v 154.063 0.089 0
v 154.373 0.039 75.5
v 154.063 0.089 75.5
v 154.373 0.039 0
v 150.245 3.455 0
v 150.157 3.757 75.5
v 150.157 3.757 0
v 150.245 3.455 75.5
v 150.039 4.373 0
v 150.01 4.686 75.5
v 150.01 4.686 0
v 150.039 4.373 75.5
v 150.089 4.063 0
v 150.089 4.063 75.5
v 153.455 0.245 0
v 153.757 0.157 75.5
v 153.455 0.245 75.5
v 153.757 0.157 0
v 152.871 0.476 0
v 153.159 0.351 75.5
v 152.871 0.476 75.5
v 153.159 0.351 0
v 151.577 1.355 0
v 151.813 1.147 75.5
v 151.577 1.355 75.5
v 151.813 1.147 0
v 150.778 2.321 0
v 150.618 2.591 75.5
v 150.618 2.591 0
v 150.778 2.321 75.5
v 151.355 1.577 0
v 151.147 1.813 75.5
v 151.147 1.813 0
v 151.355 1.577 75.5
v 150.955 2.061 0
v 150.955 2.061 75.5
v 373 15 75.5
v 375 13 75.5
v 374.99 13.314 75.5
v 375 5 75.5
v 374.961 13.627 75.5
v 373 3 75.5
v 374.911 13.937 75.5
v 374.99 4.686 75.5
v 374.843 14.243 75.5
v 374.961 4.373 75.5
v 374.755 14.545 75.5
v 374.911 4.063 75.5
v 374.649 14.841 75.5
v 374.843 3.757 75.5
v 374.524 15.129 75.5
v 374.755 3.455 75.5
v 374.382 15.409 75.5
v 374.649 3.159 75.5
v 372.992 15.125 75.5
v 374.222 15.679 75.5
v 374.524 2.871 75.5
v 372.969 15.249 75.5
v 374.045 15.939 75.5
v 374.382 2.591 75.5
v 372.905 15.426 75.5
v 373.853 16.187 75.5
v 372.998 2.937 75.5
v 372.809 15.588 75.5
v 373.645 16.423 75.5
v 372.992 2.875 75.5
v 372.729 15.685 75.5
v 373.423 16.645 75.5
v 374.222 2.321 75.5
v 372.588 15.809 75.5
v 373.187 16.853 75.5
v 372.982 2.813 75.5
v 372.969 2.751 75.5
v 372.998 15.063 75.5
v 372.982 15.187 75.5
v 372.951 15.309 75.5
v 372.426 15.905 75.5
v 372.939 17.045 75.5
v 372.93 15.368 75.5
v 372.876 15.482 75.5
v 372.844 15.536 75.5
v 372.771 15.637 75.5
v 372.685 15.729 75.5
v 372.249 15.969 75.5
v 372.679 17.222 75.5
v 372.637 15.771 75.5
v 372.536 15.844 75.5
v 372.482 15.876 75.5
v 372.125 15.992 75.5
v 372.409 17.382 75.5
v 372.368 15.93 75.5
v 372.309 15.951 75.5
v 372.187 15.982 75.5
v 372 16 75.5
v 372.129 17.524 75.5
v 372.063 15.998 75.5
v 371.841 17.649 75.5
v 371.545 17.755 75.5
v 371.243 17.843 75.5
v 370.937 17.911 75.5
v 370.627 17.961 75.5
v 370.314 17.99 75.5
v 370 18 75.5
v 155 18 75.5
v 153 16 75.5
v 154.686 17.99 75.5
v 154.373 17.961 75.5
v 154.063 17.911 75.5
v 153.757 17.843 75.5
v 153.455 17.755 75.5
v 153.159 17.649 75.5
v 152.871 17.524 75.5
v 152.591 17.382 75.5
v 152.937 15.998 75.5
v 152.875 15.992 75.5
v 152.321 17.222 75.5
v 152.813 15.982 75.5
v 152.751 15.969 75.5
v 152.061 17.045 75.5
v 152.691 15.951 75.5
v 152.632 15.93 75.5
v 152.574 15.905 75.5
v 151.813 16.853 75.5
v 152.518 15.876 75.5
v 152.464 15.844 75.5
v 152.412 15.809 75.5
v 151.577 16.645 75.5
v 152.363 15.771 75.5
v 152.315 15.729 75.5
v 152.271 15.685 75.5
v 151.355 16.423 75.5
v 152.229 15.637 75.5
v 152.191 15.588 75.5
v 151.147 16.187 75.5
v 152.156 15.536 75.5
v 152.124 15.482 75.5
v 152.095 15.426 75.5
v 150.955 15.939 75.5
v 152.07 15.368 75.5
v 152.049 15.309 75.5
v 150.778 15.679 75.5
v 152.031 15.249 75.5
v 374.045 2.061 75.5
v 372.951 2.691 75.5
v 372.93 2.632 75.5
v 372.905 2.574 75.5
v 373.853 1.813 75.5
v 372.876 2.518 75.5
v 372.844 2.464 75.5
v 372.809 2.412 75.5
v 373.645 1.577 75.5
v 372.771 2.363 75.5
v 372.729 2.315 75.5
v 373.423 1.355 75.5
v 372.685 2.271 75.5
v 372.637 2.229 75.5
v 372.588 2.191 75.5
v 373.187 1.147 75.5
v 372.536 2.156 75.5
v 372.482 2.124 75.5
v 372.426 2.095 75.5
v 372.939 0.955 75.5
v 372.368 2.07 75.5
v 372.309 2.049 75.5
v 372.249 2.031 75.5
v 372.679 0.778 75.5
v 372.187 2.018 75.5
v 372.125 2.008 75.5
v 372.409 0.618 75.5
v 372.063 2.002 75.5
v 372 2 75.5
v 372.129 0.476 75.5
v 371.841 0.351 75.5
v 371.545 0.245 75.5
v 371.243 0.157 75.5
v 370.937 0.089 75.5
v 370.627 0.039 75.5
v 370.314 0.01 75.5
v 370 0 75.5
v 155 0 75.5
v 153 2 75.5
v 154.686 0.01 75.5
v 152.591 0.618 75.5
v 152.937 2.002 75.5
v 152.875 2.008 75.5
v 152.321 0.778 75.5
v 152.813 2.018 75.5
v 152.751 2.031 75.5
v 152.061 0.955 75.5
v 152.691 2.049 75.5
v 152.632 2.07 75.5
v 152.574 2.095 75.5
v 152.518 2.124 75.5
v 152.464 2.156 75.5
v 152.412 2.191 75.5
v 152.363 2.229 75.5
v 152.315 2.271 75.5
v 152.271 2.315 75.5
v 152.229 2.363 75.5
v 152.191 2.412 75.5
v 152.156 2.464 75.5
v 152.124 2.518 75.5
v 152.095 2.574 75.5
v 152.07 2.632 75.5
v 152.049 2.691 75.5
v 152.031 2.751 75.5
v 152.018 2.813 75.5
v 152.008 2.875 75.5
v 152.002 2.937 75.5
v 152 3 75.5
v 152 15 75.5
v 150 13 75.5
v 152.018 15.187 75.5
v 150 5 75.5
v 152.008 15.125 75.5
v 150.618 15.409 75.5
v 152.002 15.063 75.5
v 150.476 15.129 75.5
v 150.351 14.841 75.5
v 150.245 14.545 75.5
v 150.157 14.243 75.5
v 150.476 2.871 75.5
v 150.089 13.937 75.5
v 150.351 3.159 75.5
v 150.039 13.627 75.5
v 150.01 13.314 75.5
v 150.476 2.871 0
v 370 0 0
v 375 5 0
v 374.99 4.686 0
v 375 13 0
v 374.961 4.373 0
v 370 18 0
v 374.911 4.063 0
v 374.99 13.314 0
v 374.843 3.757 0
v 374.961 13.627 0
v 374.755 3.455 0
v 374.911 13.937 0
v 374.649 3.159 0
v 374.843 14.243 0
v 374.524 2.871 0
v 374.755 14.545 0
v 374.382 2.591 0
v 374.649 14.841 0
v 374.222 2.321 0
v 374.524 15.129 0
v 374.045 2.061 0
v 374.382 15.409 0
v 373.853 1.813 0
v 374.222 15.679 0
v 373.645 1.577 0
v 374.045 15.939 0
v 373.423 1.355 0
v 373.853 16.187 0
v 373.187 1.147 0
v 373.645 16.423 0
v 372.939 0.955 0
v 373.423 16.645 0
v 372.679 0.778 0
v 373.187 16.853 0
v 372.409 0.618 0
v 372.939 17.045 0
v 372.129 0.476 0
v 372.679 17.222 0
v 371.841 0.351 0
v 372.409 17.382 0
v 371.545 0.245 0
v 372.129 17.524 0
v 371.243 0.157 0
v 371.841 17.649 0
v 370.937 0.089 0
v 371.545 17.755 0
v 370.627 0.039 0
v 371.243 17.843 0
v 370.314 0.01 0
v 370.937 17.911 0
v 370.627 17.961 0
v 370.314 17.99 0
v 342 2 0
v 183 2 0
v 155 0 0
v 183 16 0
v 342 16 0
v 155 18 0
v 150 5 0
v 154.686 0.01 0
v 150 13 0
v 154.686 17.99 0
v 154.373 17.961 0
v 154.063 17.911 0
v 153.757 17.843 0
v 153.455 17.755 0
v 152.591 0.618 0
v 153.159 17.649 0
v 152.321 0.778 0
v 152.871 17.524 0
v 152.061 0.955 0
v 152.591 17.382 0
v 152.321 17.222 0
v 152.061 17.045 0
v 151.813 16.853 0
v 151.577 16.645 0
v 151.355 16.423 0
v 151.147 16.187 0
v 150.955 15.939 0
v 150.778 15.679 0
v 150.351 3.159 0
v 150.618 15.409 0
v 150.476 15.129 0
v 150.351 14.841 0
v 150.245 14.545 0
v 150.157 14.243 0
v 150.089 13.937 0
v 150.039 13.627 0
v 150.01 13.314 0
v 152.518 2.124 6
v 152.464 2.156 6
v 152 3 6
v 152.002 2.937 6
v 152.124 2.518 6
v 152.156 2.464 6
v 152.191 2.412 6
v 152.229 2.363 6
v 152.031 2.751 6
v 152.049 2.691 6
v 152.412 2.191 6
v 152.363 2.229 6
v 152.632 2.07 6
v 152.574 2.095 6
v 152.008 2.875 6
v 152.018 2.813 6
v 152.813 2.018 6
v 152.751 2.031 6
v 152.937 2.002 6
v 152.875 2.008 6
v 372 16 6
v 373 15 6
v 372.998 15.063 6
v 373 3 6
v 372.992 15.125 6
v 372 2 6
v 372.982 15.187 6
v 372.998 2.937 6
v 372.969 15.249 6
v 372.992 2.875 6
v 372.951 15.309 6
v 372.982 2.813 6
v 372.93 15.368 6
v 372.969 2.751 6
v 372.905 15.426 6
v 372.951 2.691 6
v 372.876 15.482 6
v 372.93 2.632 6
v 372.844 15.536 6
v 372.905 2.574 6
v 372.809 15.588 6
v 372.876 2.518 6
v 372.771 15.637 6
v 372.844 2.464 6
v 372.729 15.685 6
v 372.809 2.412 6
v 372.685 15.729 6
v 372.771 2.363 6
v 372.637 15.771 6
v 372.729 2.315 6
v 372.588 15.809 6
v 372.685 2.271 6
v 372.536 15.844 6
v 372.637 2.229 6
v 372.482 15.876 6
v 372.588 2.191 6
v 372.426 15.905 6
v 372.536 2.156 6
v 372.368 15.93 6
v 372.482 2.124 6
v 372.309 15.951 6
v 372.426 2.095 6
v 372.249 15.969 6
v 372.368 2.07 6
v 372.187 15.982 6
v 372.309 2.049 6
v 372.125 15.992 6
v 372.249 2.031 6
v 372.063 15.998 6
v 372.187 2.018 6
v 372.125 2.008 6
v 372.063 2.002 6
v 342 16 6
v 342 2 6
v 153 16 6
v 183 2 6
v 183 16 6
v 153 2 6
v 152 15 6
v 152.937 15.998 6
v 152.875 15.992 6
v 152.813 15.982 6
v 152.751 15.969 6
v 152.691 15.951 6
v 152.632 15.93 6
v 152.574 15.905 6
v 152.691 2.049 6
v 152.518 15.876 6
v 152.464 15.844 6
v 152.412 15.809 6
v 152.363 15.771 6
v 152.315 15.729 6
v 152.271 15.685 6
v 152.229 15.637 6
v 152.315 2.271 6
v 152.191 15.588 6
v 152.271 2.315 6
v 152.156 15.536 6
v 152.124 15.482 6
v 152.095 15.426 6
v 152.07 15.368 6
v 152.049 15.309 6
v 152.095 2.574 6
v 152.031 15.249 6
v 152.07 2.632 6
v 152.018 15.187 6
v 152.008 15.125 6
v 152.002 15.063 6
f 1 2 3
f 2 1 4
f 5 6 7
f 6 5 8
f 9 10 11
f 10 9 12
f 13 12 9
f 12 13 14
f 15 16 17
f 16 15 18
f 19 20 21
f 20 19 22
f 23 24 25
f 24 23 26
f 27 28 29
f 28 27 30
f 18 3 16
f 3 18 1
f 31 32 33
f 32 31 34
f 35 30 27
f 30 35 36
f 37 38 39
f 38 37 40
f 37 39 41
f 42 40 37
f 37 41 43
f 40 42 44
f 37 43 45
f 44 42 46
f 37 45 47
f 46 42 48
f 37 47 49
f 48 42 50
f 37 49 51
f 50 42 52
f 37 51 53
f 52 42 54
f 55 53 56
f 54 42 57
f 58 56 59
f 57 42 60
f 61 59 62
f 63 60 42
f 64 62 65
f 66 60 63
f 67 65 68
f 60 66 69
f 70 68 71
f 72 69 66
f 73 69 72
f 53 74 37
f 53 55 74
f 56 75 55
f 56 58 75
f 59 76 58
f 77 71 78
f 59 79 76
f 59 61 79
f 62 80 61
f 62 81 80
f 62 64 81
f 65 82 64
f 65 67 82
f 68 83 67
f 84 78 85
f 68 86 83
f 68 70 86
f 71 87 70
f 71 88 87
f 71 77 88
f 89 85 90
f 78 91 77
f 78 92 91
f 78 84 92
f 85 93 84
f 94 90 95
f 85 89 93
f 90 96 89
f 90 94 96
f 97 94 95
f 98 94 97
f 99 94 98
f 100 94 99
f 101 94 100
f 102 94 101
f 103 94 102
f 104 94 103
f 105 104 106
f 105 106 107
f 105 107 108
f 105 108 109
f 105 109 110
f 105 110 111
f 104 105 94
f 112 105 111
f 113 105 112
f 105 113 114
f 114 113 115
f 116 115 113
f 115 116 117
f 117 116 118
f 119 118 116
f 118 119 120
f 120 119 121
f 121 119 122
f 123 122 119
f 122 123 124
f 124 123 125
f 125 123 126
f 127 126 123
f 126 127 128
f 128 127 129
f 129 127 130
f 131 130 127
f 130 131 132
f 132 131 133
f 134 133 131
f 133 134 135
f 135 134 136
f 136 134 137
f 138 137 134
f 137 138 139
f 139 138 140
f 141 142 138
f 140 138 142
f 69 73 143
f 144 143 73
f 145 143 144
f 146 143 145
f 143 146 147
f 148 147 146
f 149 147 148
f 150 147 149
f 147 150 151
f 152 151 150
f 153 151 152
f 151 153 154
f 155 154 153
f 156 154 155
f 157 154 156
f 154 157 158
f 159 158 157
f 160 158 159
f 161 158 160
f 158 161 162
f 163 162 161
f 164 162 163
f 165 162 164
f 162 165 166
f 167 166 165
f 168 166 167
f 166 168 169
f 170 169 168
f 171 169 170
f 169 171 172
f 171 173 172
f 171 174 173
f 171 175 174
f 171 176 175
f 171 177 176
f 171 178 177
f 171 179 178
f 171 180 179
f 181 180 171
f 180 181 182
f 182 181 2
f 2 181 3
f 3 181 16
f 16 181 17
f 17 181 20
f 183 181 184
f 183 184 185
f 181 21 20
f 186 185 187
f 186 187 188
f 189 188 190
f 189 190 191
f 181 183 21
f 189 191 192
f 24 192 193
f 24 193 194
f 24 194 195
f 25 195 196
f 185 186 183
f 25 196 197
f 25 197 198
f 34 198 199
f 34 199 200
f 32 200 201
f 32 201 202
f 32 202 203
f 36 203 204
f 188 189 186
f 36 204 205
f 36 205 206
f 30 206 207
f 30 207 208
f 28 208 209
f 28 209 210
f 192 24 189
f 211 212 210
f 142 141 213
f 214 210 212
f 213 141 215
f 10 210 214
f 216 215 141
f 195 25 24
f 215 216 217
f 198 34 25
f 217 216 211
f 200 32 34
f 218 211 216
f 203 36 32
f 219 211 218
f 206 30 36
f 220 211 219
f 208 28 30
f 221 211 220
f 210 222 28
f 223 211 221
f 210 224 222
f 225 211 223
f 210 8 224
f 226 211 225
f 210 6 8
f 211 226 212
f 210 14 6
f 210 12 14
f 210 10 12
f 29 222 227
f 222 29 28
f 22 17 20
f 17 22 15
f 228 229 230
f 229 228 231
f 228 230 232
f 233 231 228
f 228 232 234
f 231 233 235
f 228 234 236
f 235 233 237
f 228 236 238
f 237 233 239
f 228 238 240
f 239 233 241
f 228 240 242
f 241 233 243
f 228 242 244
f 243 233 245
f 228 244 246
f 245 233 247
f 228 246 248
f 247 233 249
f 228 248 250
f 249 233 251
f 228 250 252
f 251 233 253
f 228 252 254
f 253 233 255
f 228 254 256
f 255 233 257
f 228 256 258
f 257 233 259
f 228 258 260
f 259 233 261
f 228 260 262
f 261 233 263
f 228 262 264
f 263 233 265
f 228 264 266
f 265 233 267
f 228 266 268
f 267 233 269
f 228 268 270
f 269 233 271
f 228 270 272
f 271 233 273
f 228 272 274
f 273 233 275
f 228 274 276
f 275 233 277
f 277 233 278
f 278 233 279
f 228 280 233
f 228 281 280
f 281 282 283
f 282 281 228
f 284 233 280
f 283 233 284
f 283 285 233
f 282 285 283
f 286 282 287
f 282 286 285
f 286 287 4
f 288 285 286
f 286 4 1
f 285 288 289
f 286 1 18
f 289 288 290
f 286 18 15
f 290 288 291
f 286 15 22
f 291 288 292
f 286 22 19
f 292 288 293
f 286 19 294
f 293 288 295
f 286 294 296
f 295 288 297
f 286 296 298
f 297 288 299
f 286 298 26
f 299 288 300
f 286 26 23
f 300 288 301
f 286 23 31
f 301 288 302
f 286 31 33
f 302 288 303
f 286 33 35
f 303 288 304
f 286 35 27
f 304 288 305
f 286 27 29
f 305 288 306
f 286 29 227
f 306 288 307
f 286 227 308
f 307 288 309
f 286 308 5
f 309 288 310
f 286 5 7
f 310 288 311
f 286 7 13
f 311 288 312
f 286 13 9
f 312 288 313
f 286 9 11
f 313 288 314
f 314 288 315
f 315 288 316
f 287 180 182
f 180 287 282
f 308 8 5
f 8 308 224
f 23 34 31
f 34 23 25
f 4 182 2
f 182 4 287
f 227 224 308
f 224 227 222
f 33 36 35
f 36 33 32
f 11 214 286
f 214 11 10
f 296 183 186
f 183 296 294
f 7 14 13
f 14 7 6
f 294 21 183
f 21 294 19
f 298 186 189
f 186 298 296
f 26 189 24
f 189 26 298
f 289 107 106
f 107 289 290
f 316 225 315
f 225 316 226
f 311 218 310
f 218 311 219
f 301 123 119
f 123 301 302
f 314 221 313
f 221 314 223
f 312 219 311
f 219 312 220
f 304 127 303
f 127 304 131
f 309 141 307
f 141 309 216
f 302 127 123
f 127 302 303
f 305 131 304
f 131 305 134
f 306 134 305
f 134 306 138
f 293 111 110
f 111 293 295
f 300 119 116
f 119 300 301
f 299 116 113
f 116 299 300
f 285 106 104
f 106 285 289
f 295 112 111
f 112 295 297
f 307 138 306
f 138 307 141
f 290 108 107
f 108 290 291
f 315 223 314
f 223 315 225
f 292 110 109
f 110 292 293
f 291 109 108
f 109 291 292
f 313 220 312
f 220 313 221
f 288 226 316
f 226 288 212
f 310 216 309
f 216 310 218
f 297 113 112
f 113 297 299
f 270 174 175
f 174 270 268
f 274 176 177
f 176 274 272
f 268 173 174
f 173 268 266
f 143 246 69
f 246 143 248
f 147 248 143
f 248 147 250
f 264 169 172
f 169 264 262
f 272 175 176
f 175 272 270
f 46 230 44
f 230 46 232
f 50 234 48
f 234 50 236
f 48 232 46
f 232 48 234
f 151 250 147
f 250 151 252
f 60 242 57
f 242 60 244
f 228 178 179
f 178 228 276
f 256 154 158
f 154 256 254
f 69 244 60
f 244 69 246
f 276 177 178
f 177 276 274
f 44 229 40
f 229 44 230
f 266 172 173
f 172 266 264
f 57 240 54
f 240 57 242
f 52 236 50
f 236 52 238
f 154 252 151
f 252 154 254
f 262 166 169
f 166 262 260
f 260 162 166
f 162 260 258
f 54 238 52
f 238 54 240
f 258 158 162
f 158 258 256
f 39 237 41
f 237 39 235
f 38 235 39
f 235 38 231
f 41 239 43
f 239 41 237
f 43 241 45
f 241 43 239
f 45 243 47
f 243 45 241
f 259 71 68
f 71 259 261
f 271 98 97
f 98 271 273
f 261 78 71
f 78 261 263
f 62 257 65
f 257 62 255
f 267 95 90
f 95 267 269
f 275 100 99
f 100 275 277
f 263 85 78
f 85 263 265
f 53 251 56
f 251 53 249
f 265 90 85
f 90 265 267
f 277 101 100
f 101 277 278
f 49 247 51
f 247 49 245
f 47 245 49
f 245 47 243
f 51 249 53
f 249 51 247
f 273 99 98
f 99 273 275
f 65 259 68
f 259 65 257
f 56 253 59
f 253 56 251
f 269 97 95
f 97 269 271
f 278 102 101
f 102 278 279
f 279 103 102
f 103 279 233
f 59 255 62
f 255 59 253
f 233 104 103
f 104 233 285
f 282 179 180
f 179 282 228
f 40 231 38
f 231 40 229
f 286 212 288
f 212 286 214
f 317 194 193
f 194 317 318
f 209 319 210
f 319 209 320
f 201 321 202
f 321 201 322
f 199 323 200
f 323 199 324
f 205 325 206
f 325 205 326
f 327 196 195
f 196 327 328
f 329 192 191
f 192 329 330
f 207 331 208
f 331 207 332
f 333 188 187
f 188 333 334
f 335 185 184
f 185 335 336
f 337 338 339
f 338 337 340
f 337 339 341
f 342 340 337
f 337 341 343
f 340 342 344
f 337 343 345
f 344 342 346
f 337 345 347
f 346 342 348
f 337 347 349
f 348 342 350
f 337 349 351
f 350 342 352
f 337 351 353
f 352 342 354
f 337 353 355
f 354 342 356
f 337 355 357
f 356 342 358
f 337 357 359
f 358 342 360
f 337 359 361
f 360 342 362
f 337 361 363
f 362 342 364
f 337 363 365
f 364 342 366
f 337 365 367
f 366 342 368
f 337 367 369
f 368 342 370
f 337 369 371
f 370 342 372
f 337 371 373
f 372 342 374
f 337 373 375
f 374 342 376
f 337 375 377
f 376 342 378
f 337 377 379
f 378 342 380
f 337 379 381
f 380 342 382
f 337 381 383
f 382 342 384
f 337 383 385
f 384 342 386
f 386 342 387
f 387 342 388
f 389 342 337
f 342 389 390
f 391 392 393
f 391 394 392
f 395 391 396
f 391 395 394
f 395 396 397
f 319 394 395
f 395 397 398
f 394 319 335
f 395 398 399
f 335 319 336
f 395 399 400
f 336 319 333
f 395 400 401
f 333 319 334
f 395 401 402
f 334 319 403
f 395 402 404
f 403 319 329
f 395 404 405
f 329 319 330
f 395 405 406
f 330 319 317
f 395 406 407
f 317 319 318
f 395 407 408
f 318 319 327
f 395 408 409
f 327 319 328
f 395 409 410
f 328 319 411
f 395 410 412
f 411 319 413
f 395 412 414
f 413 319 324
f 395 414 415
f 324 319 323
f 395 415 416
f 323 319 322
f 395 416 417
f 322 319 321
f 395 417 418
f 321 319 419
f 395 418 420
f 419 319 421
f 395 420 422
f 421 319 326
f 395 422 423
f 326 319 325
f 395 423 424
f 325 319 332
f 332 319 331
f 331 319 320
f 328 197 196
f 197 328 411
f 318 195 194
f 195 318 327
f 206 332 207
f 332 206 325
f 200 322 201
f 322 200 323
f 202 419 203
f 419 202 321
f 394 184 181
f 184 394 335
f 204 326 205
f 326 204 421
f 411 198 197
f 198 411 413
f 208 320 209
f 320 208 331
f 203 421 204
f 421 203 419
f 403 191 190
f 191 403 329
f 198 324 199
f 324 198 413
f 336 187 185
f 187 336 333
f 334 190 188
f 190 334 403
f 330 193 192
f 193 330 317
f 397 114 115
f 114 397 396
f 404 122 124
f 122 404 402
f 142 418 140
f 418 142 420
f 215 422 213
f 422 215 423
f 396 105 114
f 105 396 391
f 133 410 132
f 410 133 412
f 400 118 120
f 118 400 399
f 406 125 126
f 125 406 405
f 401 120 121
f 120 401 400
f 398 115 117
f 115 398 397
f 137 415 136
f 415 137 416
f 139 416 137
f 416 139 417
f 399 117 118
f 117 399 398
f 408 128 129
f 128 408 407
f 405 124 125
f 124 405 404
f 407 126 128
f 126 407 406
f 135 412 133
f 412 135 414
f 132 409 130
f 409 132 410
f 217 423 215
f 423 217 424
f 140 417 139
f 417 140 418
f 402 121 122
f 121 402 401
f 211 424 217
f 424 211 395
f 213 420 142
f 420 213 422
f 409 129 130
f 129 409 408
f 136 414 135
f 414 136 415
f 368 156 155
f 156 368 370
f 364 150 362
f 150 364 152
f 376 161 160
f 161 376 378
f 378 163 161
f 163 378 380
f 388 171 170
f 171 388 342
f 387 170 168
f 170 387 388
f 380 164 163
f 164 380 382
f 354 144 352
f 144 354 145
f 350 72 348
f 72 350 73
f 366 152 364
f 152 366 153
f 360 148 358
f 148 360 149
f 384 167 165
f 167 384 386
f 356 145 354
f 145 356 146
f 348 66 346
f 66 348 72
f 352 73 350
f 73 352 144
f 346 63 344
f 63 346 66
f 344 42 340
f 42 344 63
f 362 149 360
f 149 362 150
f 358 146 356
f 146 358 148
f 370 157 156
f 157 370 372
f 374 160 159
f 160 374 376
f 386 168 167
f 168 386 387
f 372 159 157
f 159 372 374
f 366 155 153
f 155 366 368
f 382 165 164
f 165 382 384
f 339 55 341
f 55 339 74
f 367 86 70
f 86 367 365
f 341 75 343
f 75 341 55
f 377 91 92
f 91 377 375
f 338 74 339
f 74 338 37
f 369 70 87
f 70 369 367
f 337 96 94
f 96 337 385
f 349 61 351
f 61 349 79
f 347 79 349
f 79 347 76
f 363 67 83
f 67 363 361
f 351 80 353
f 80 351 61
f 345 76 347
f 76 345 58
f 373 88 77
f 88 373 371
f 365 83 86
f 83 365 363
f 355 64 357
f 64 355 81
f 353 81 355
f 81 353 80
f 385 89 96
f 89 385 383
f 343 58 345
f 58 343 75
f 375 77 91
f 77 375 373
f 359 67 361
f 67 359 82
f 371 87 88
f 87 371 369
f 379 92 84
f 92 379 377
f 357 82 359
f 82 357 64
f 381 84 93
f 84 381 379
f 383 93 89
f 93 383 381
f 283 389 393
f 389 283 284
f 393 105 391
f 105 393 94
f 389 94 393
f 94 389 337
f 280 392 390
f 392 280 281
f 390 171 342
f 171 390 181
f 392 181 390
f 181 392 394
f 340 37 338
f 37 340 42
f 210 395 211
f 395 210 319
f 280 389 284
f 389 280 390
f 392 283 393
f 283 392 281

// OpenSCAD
// file: clips.scad
/*
Provides 2 functions:
    clip(height): An actual clip, height is the height to print with the click laid flat
    socket(height): The cutout to generate for the clip. It's suggented to make the height slightly more to ease access
*/
CLIP_STOPPER = 2;
CLIP_SOCKET_W = 7*2;
CLIP_SOCKET_D = 10.6;

module sampleclipsocket() {
    translate([0, 0, 0]) {
        union() {
            clip(1);
            //translate([-6, -10, 0]) cube([12, 10, 1]);
            mirror([0, 1, 0]) clip(1);
        }
    }
    //%cliphollow(2);

    rotate([-90, 0, 0]) {
    translate([20, -13, 0]) {
        difference() {
            translate([-10, 0, 0]) cube([20, 13, 3]);
            translate([0, 0, 1.4/2]) socket(1.6);
        }
    }
}
}

//sampleclipsocket();

clipmainpoints = [
    [4.9, 5.695],
    [5.197, 5.905],
        // Edges of outer corner
        [5.253, 5.991],
        [5.297, 6.103],
        [5.324, 6.233],
        [5.331, 6.37],
    [5.318, 6.50],
    [4.868, 7.284],
    [2.55, 9.60],
    ];

clipstopperpoints = [
    [0,0],
    [6.6, 0],
    [6.6, CLIP_STOPPER],
    [4.9, CLIP_STOPPER],
];

cliphollowpoints = concat(clipmainpoints, [[0,  9.60], [0, 1.5], [4.9, 1.5]]);

//for(x=clipmainpoints) translate(x) color("aqua") cylinder(h=2, d=0.1);
//for(x=clipstopperpoints) translate(x) color("red") cylinder(h=2, d=0.1);
//for(x=clipmainpoints) translate(x) color("aqua") cylinder(h=2, d=0.1);
    
// The area to hollow out around a clip so the arms can bend
// Area should be hollowed, before clip is then built in place
module cliphollow(h) {
    linear_extrude(h) polygon(cliphollowpoints);
    linear_extrude(h) mirror([1, 0 ,0]) polygon(cliphollowpoints);
}

module socket(h) {
    linear_extrude(h) socketpolygon();
}

module socketpolygon() {
    socketedge();
    mirror([1, 0 ,0]) socketedge();
    
    module socketedge() {
        polygon([
            [0, 0], 
            [7, 0],
            [7, 2],
            [6, 2],
            [5, 5],
            [5, 6],
            [7, 6],
            [7, 10.6],
            [0, 10.6],
            ]);
    }
}

module clip(h, scale_width=1) {
    scale([scale_width, 1, 1]) linear_extrude(h) clippolygon();
}



module clippolygon() {
    //W = 13.2;
    D = 3.7;
   // H = 3.5;
    H = 1.5;
    
    clipedge();
    mirror([1, 0, 0]) clipedge();

    module clipedge() {
        resolution = 20;




        curve = [
            [1, 9.60],
            [2.1, 5.85],
            [2.7, 1.55],
            [0, 1.578],
            ];
        curvepoints = bezier(curve);

        fullpoints = concat(curvepoints, clipstopperpoints, clipmainpoints);
        polygon(fullpoints);


        function choose(n, k)=
             k == 0 ? 1 : (n * choose(n - 1, k - 1)) / k;

        function _point_on_bezier_rec(points,t,i,c)=
            len(points) == i ? c
            : _point_on_bezier_rec(points,t,i+1,c+choose(len(points)-1,i) * pow(t,i) * pow(1-t,len(points)-i-1) * points[i]);

        function _point_on_bezier(points,t)=
            _point_on_bezier_rec(points,t,0,[0,0]);

        //a bezier curve with any number of control points
        //parameters: 
        //points - the control points of the bezier curve (number of points is variable)
        //returns:
        //resolution number of samples on the bezier curve
        function bezier(points)=[
            for (t =[0:1.0/resolution:1+1.0/(resolution/2)]) _point_on_bezier(points,t)
        ];

    }
}
// file: consts.scad
$fn=100;

FLOOR = 1;
WALL = 1;
BASE_H= 3;

CLIP_H = 1.4;

BOX_H = 115;
BOX_W = 305;
BOX_D = 305;

// Upper tray for large minis
UPPER_MINI_MAX_H = 74;
UPPER_TRAY_H = FLOOR + UPPER_MINI_MAX_H; // 75mm
UPPER_TRAY_W = 140;
UPPER_TRAY_D = 131;

// Lower tray for small minis
LOWER_MINI_MAX_H = 47;
LOWER_TRAY_W = 200;
LOWER_TRAY_D = 200;
LOWER_TRAY_H  = FLOOR + LOWER_MINI_MAX_H; // 48mm
LOWER_TRAY_UPPER_H = BOX_H - UPPER_TRAY_H; // 40mm

// Terrain tiles
LARGE_TERRAIN_TILE_W = 217;
LARGE_TERRAIN_TILE_D = 115;
LARGE_TERRAIN_TILE_H = 9; // stack

SMALL_TERRAIN_TILE_W = 115;
SMALL_TERRAIN_TILE_D = 115;
SMALL_TERRAIN_TILE_H = 68;

TERRAIN_FLOOR = 1;
TERRAIN_SUPPORT = 3;
TERRAIN_WALL = 3;
TERRAIN_PEG_EDGE = 20;

SMALL_TERRAIN_TILES = 32;
LARGE_TERRAIN_TILES = 4;

SMALL_TERRAIN_BASE_W = SMALL_TERRAIN_TILE_W*2;
SMALL_TERRAIN_BASE_D = SMALL_TERRAIN_TILE_D;
SMALL_TERRAIN_BASE_H = SMALL_TERRAIN_TILE_H/2 + TERRAIN_SUPPORT + 9;

LARGE_TERRAIN_BASE_W = LARGE_TERRAIN_TILE_W;
LARGE_TERRAIN_BASE_D = LARGE_TERRAIN_TILE_D;
LARGE_TERRAIN_BASE_H = LARGE_TERRAIN_TILE_H + TERRAIN_SUPPORT + 9;

TERRAIN_V_WALL = 2;
TERRAIN_TAB_W = 6;
TERRAIN_TAB_D = 16;
TERRAIN_V_SUPPORT_W = TERRAIN_TAB_W + 25;

SMALL_TERRAIN_BOX_W = SMALL_TERRAIN_TILE_W + TERRAIN_V_WALL*2 + 4;
SMALL_TERRAIN_BOX_D = SMALL_TERRAIN_TILE_H + TERRAIN_V_WALL*2 + 5;
SMALL_TERRAIN_BOX_H = SMALL_TERRAIN_TILE_D/2 + TERRAIN_V_WALL + TERRAIN_TAB_D;

LARGE_TERRAIN_BOX_W = LARGE_TERRAIN_TILE_W + TERRAIN_V_WALL*2 + 4;
LARGE_TERRAIN_BOX_D = LARGE_TERRAIN_TILE_H + TERRAIN_V_WALL*2 + 5;
LARGE_TERRAIN_BOX_H = LARGE_TERRAIN_TILE_D/2 + TERRAIN_V_WALL + TERRAIN_TAB_D;

// Cards
CARD_W = 64;
CARD_D = 89;
CARD_STACK = 30;

CARD_WALL = 1.5;
CARD_EDGE_WALL = CLIP_H + 2;

CARD_BOX_W = CARD_W + CARD_EDGE_WALL*2 + 2;
CARD_BOX_D = CARD_STACK + CARD_WALL*2 + 5;
CARD_BOX_H = CARD_D / 3 * 2 + CARD_WALL;

CARD_BOX_LID_H = CARD_D / 3 + CARD_WALL + 5;




// A small file to allow clips to made to provide a cover where required
include <clips.scad>

use <MCAD/boxes.scad>

module roundedCube(size, radius, sidesonly) {
    translate([size[0]/2, size[1]/2, size[2]/2]) roundedBox(size, radius, sidesonly);
}
// main file
include <consts.scad>;


module small_terrain_tiles_vertical() {
    difference() {
        union() {
            translate([0, 0, 0]) roundedCube([SMALL_TERRAIN_BOX_W, SMALL_TERRAIN_BOX_D, SMALL_TERRAIN_BOX_H], 5, true);
            echo([SMALL_TERRAIN_BOX_W, SMALL_TERRAIN_BOX_D, SMALL_TERRAIN_BOX_H], 5, true);
        }
        translate([TERRAIN_V_WALL, TERRAIN_V_WALL, TERRAIN_TAB_W]) roundedCube([SMALL_TERRAIN_BOX_W-TERRAIN_V_WALL*2, SMALL_TERRAIN_BOX_D-TERRAIN_V_WALL*2, SMALL_TERRAIN_BOX_H], 1, true);
        translate([TERRAIN_V_SUPPORT_W+TERRAIN_V_WALL, TERRAIN_V_WALL, -0.1]) cube([SMALL_TERRAIN_BOX_W-TERRAIN_V_SUPPORT_W*2-TERRAIN_V_WALL*2, SMALL_TERRAIN_BOX_D-TERRAIN_V_WALL*2, SMALL_TERRAIN_BOX_H], 5, true);
    }
    //#translate([TERRAIN_V_WALL, 2*SMALL_TERRAIN_TILES+TERRAIN_V_WALL, 0]) rotate([90, 0, 0]) small_terrain_tile(SMALL_TERRAIN_TILES);
}

module large_terrain_tiles_vertical() {
    difference() {
        union() {
            translate([0, 0, 0]) roundedCube([LARGE_TERRAIN_BOX_W, LARGE_TERRAIN_BOX_D, LARGE_TERRAIN_BOX_H], 5, true);
            echo([LARGE_TERRAIN_BOX_W, LARGE_TERRAIN_BOX_D, LARGE_TERRAIN_BOX_H], 5, true);
        }
        translate([TERRAIN_V_WALL, TERRAIN_V_WALL, TERRAIN_TAB_W]) roundedCube([LARGE_TERRAIN_BOX_W-TERRAIN_V_WALL*2, LARGE_TERRAIN_BOX_D-TERRAIN_V_WALL*2, LARGE_TERRAIN_BOX_H], 1, true);
        translate([TERRAIN_V_SUPPORT_W+TERRAIN_V_WALL, TERRAIN_V_WALL, -0.1]) cube([LARGE_TERRAIN_BOX_W-TERRAIN_V_SUPPORT_W*2-TERRAIN_V_WALL*2, LARGE_TERRAIN_BOX_D-TERRAIN_V_WALL*2, LARGE_TERRAIN_BOX_H], 5, true);
    }
    //#translate([TERRAIN_V_WALL, 2*LARGE_TERRAIN_TILES+TERRAIN_V_WALL, 0]) rotate([90, 0, 0]) large_terrain_tile(LARGE_TERRAIN_TILES);
}

module small_terrain_tiles() {
    difference() {
        union() {
            // Floor for the holder
            translate([0, 0, TERRAIN_SUPPORT-TERRAIN_FLOOR]) roundedCube([SMALL_TERRAIN_BASE_W, SMALL_TERRAIN_BASE_D, TERRAIN_FLOOR], 5, true);
            // Cubes for corner pegs, that are then cut out
            terrain_pegs(SMALL_TERRAIN_BASE_W/2, SMALL_TERRAIN_BASE_D, SMALL_TERRAIN_BASE_H);
            translate([SMALL_TERRAIN_BASE_W/2, 0, 0]) terrain_pegs(SMALL_TERRAIN_BASE_W/2, SMALL_TERRAIN_BASE_D, SMALL_TERRAIN_BASE_H);
            base_support(SMALL_TERRAIN_BASE_W, SMALL_TERRAIN_BASE_D);
            // A small peg to hold the tray above in place
            translate([SMALL_TERRAIN_BASE_W/2, 10, SMALL_TERRAIN_BASE_H]) cylinder(d=4, h=TERRAIN_SUPPORT);
            translate([SMALL_TERRAIN_BASE_W/2, SMALL_TERRAIN_BASE_D - 10, SMALL_TERRAIN_BASE_H]) cylinder(d=4, h=TERRAIN_SUPPORT);
        }
        // Thumb holes to get the last tiles out, offset to align with tile tab
        translate([0, SMALL_TERRAIN_BASE_D/2-10, -0.1]) cylinder(h=10, d=30);
        translate([SMALL_TERRAIN_BASE_W, SMALL_TERRAIN_BASE_D/2+10, -0.1]) cylinder(h=10, d=30);
    }
}

module large_terrain_tiles() {
    difference() {
        union() {
            // Floor for the holder
            translate([0, 0, TERRAIN_SUPPORT-TERRAIN_FLOOR]) roundedCube([LARGE_TERRAIN_BASE_W, LARGE_TERRAIN_BASE_D, TERRAIN_FLOOR], 5, true);
            // Cubes for corner pegs, that are then cut out
            terrain_pegs(LARGE_TERRAIN_BASE_W, LARGE_TERRAIN_BASE_D, LARGE_TERRAIN_BASE_H);
            base_support(LARGE_TERRAIN_BASE_W, LARGE_TERRAIN_BASE_D);
            // Support for the alignment holes
            translate([LARGE_TERRAIN_BASE_W/2, 10, 0]) cylinder(d=10, h=TERRAIN_SUPPORT);
            translate([LARGE_TERRAIN_BASE_W/2, LARGE_TERRAIN_BASE_D - 10, 0]) cylinder(d=10, h=TERRAIN_SUPPORT);
        }
        // Thumb holes to get the last tiles out, offset to align with tile tab
        translate([0, LARGE_TERRAIN_BASE_D/2-10, -0.1]) cylinder(h=10, d=30);
        // A small hole to align with the peg below
        translate([LARGE_TERRAIN_BASE_W/2, 10, -0.1]) cylinder(d=5, h=TERRAIN_SUPPORT+2);
        translate([LARGE_TERRAIN_BASE_W/2, LARGE_TERRAIN_BASE_D - 10, -0.1]) cylinder(d=5, h=TERRAIN_SUPPORT+2);
    }
}

module base_support(W, D) {
    // This is a grid that's on the base to improve strength, without using solid plastic everywhere
    spacing = 30;
    for (x=[spacing/2:spacing:W]) {
        translate([x, 0, 0]) cube([TERRAIN_SUPPORT, D, TERRAIN_SUPPORT]);
    }
    for (y=[spacing/2:spacing:D]) {
        translate([0, y, 0]) cube([W, TERRAIN_SUPPORT, TERRAIN_SUPPORT]);
    }
}

module terrain_pegs(W, D, H) {
    difference() {
        union() {
            roundedCube([W, D, H], 5, true);
        }
        translate([TERRAIN_WALL, TERRAIN_WALL, 0]) roundedCube([W-TERRAIN_WALL*2, D-TERRAIN_WALL*2, H+0.1], 5, true);
        translate([TERRAIN_PEG_EDGE, -0.01, 0]) cube([(W)-TERRAIN_PEG_EDGE*2, D+0.1, H+0.1]);
        translate([-0.01, TERRAIN_PEG_EDGE, 0]) cube([(W)+0.1, D-TERRAIN_PEG_EDGE*2, H+0.1]);
    }
}

module small_terrain_tile(count=1) {
    for (i=[0:count-1]) {
        color((i%2 == 1) ? "blue" : "red")
        translate([58, 58, 2*i]) mirror() linear_extrude(2) polygon(SMALL_TERRAIN_TILE_POINTS);
    }
}
module large_terrain_tile(count=1) {
    for (i=[0:count-1]) {
        color((i%2 == 1) ? "blue" : "red")
        translate([109, 58, 2*i]) rotate([0, 0, 90]) mirror() linear_extrude(2) polygon(LARGE_TERRAIN_TILE_POINTS);
    }
}

/*
small_terrain_tiles();
#translate([0, 0, TERRAIN_SUPPORT]) small_terrain_tile(34/2);
#translate([SMALL_TERRAIN_BASE_W/2, 0, TERRAIN_SUPPORT]) small_terrain_tile();

translate([0, 150, 0]) {
    large_terrain_tiles();
    #translate([0, 0, TERRAIN_SUPPORT]) large_terrain_tile(4);
}
*/

//small_terrain_tiles_vertical();
translate([150, 0, 0]) large_terrain_tiles_vertical();







function min_x(shape_points) = min([ for (x = shape_points) min(x[0])]);
function max_x(shape_points) = max([ for (x = shape_points) max(x[0])]);
function min_y(shape_points) = min([ for (x = shape_points) min(x[1])]);
function max_y(shape_points) = max([ for (x = shape_points) max(x[1])]);
echo(min_x(LARGE_TERRAIN_TILE_POINTS));
echo(min_y(LARGE_TERRAIN_TILE_POINTS));

SMALL_TERRAIN_TILE_POINTS = [[0.158923,57.470413],[-0.825423,56.789624],[-1.482859,55.790933],[-1.781982,55.074787],[-1.909269,54.413383],[-1.869424,53.734647],[-1.667147,52.966503],[-1.329913,52.127030],[-0.905831,51.462059],[0.580704,50.188713],[1.264915,49.452653],[1.484806,48.915684],[1.474476,48.062073],[1.203015,46.838803],[1.002407,46.346343],[0.748407,45.910413],[0.494407,45.537573],[0.145157,45.233893],[-0.685771,44.811993],[-1.060712,44.664279],[-1.860610,44.604179],[-7.094282,44.708853],[-14.625483,44.795553],[-16.523178,44.872853],[-17.092640,45.559529],[-17.735627,46.735963],[-19.733844,50.713533],[-20.293530,51.189873],[-30.851353,51.310443],[-45.178430,51.231310],[-50.506664,50.998443],[-50.824891,50.352063],[-51.021783,43.370463],[-51.208187,36.753193],[-51.195927,35.948003],[-51.075038,25.717463],[-51.070338,22.834793],[-51.039778,20.079123],[-51.464817,19.820643],[-55.352106,17.898596],[-56.823716,17.137963],[-57.232874,16.575885],[-57.390499,14.875585],[-57.385633,8.629708],[-57.313460,2.723272],[-57.176738,0.698467],[-56.504512,-0.591631],[-55.733362,-1.503507],[-54.890360,-1.809141],[-53.924757,-1.952860],[-52.966864,-1.926699],[-52.146992,-1.722694],[-50.715946,-0.522569],[-49.704087,0.382587],[-48.784823,0.881828],[-47.852843,1.010899],[-46.802831,0.805543],[-46.129650,0.487387],[-45.444281,-0.063583],[-44.765505,-0.911357],[-44.516002,-2.159033],[-44.526672,-9.334533],[-44.580112,-12.192033],[-44.587012,-15.049533],[-44.669840,-16.547024],[-44.864203,-16.809370],[-45.269491,-17.070023],[-47.702017,-18.385113],[-50.227498,-19.707188],[-50.634231,-20.004026],[-50.813517,-20.265486],[-50.975839,-21.897930],[-51.039757,-27.931826],[-51.214057,-35.393076],[-51.229297,-35.560033],[-51.218047,-36.274733],[-51.264005,-36.975142],[-51.145397,-37.639983],[-50.995451,-39.132705],[-50.945768,-43.053033],[-50.867700,-48.785912],[-50.643541,-50.788846],[-50.053799,-51.253505],[-48.665207,-51.529081],[-46.228653,-51.640797],[-42.495022,-51.613875],[-29.955545,-51.535668],[-21.303802,-51.663445],[-20.371792,-51.817674],[-19.845812,-52.035746],[-18.494529,-54.304365],[-17.403048,-56.388033],[-17.034103,-56.984718],[-16.662573,-57.503960],[-16.229502,-57.637525],[-14.286351,-57.751070],[-8.627832,-57.785033],[-1.394468,-57.681814],[-0.120893,-57.461112],[0.609470,-57.046191],[1.252333,-56.474763],[1.708296,-55.678623],[2.118836,-54.265539],[1.986199,-52.922727],[1.324868,-51.697034],[0.149325,-50.635310],[-0.657741,-50.001532],[-1.097643,-49.318125],[-1.349742,-48.594584],[-1.415040,-47.896447],[-1.294207,-47.240049],[-0.987913,-46.641727],[-0.327987,-45.920225],[0.127413,-45.568550],[0.954580,-45.149833],[2.613605,-44.919709],[10.034992,-44.919993],[15.854205,-45.152899],[16.763089,-45.382806],[17.119004,-45.783533],[17.735845,-46.758915],[18.147484,-47.441884],[19.998815,-50.764508],[20.539467,-51.065433],[21.512984,-51.330150],[34.668689,-51.491066],[48.563979,-51.408620],[50.292109,-51.161991],[51.080279,-50.726100],[51.274461,-50.422979],[51.353677,-49.586611],[51.223959,-43.434035],[51.129059,-33.147035],[51.091159,-26.643168],[51.072139,-21.623631],[51.235399,-20.394650],[51.848530,-19.935887],[53.178279,-19.225395],[56.052217,-17.725585],[56.694141,-17.267276],[57.053639,-16.851706],[57.390499,-16.332192],[57.390499,-8.217057],[57.309245,-0.556162],[57.083530,0.542380],[56.624069,1.171695],[55.598579,1.928664],[54.282569,2.368667],[53.663425,2.359325],[52.895309,2.047994],[51.657329,1.137504],[50.566106,-0.105531],[49.738522,-0.837503],[48.982614,-1.189861],[48.106419,-1.294055],[47.108131,-1.181603],[46.223431,-0.806550],[45.482480,-0.187341],[44.915439,0.657579],[44.663307,1.291888],[44.519044,2.159333],[44.416229,6.095965],[44.277439,9.612097],[44.288639,9.994066],[44.426519,13.047347],[44.552289,16.163096],[44.979935,16.681406],[46.727319,17.628994],[49.537381,19.120952],[50.505039,19.897853],[51.049119,20.481113],[51.035319,27.353793],[51.022819,34.861463],[51.018819,39.369963],[51.047419,46.991963],[50.988156,50.648369],[50.797823,51.207885],[50.433519,51.401713],[43.442299,51.491204],[28.309139,51.422813],[20.329861,51.411613],[20.057690,51.568902],[19.828389,51.896253],[19.513423,52.324033],[19.472043,52.436643],[19.352539,52.706193],[19.163441,53.005213],[17.739951,56.070533],[16.863605,57.435783],[16.492434,57.785033],[8.588686,57.767933],[1.611097,57.717852],[0.587801,57.632715],[0.158955,57.470483],[0.158923,57.470413]];
LARGE_TERRAIN_TILE_POINTS = [[1.851202,108.682148],[0.120473,108.405568],[-0.994618,107.720688],[-1.838477,106.629218],[-2.146811,105.850702],[-2.212797,104.881588],[-2.148445,103.974291],[-1.903243,103.220655],[-1.398975,102.462955],[-0.557427,101.543468],[0.392983,100.492768],[0.914195,99.646351],[1.071961,98.844607],[0.932033,97.927928],[0.662800,97.311678],[0.112392,96.667378],[-0.558252,96.095584],[-1.363763,95.803690],[-2.726868,95.718122],[-5.070297,95.765308],[-12.514758,95.860008],[-16.993786,95.983818],[-17.454775,96.399818],[-17.706497,96.910098],[-17.961608,97.354598],[-18.173727,97.767348],[-18.490419,98.260728],[-18.722801,98.841828],[-19.040301,99.418348],[-19.357800,99.909138],[-19.801323,100.970041],[-20.490426,101.920738],[-21.654352,102.225113],[-23.009489,102.187428],[-23.707988,102.179428],[-29.617769,102.326538],[-35.693385,102.472878],[-36.073006,102.523466],[-36.582104,102.404478],[-38.280490,102.248095],[-43.863494,102.212768],[-50.580312,102.212768],[-50.956491,101.896228],[-51.269410,101.515728],[-51.424357,100.975478],[-51.513627,85.744048],[-51.544184,73.347815],[-51.607299,71.425463],[-51.722256,70.938288],[-54.282795,69.474258],[-56.653024,68.202266],[-57.469264,67.572798],[-57.835202,67.156018],[-57.834554,59.713538],[-57.797937,53.446311],[-57.630250,51.460278],[-57.350053,50.660762],[-56.944400,49.964567],[-56.430088,49.394805],[-55.823916,48.974588],[-55.054921,48.677823],[-53.919036,48.627688],[-52.482266,48.722888],[-51.518814,49.531018],[-50.262954,50.625790],[-49.201464,51.232331],[-48.142553,51.422723],[-46.894430,51.269048],[-46.240834,51.034528],[-45.633985,50.538798],[-45.119881,49.915577],[-44.951563,49.126718],[-44.874223,41.316218],[-44.888723,34.331218],[-45.202297,34.074008],[-47.200583,32.957578],[-50.318348,31.274727],[-50.820257,30.819169],[-51.045031,30.328488],[-51.212164,28.778547],[-51.239045,23.766358],[-51.179785,16.932218],[-51.113385,7.077608],[-51.132525,-0.018838],[-51.248953,-2.225142],[-51.338021,-2.557517],[-51.258963,-2.877472],[-51.035521,-16.943422],[-50.998340,-28.978711],[-51.065660,-30.567905],[-51.211977,-30.926131],[-55.892464,-33.396486],[-56.761130,-33.988536],[-57.169204,-34.456648],[-57.323334,-35.266567],[-57.376218,-42.426613],[-57.271364,-49.834490],[-56.936135,-51.112049],[-56.152731,-52.209658],[-55.129400,-52.941123],[-53.774799,-53.153341],[-52.821338,-53.138631],[-52.149409,-52.988230],[-51.536266,-52.610617],[-50.759159,-51.914268],[-49.832555,-51.072257],[-49.149676,-50.613169],[-48.469699,-50.422118],[-47.551799,-50.384224],[-46.472054,-50.437884],[-45.810395,-50.667075],[-44.987285,-51.231282],[-44.733415,-51.682525],[-44.561374,-52.396778],[-44.392896,-55.065057],[-44.342083,-60.137617],[-44.299733,-67.357447],[-44.687516,-67.644878],[-47.489951,-68.983647],[-47.795800,-69.162068],[-49.045348,-69.874535],[-50.182386,-70.611356],[-50.674491,-71.460147],[-50.823887,-83.715647],[-50.889427,-98.460396],[-50.807150,-101.382199],[-50.590906,-101.917178],[-50.187677,-102.210242],[-49.425701,-102.404854],[-47.945890,-102.539264],[-42.408301,-102.651553],[-28.692301,-102.592643],[-20.836847,-102.629167],[-19.680779,-102.864931],[-19.207378,-103.337151],[-18.622981,-104.289651],[-17.654877,-106.131151],[-16.512281,-107.932697],[-15.992406,-108.303244],[-15.352462,-108.477612],[-11.218903,-108.755458],[-5.895798,-108.798760],[-1.855039,-108.613032],[-0.006808,-108.288862],[0.868735,-107.728539],[1.579966,-106.899494],[2.057361,-105.908205],[2.231392,-104.861151],[2.089753,-103.591151],[1.995253,-103.083016],[1.431063,-102.289266],[0.723673,-101.495651],[-0.024997,-100.916642],[-0.768297,-99.915213],[-1.045053,-98.743496],[-0.829785,-97.641859],[-0.179070,-96.741116],[0.850513,-96.172080],[3.388309,-95.885207],[9.090243,-95.741061],[14.499045,-95.766568],[16.855183,-96.017332],[17.554684,-96.863579],[19.141833,-99.834883],[20.074733,-101.312807],[20.418465,-101.624050],[20.952972,-101.858487],[23.611510,-102.139611],[30.084755,-102.241509],[42.407113,-102.249511],[48.722018,-102.210014],[50.343003,-102.012712],[50.832841,-101.764218],[51.160750,-101.431568],[51.520683,-100.225651],[51.654920,-90.312730],[51.580283,-80.935405],[51.500083,-76.103558],[51.518170,-72.263113],[51.653183,-71.201746],[53.857803,-69.991400],[56.487379,-68.539000],[57.132744,-68.051031],[57.504433,-67.609120],[57.794803,-67.142151],[57.835203,-59.903151],[57.790458,-52.839667],[57.627657,-51.474101],[57.318543,-50.604124],[56.589751,-49.625279],[55.530010,-48.968859],[54.281858,-48.692476],[52.987832,-48.853740],[51.819321,-49.487499],[50.734023,-50.648819],[50.161091,-51.270963],[49.383463,-51.725383],[48.006939,-52.112372],[47.378050,-52.060349],[46.735363,-51.847101],[45.837433,-51.298367],[45.178003,-50.441651],[44.840843,-49.870151],[44.848843,-42.631151],[44.949943,-34.915399],[45.079000,-34.521072],[45.335138,-34.188630],[46.484463,-33.468139],[48.280483,-32.527544],[49.714282,-31.889415],[50.222962,-31.636235],[50.667653,-31.147785],[51.180313,-30.312151],[51.246313,-21.739651],[51.222813,-11.579642],[51.170312,13.629858],[51.129155,24.339814],[51.226616,29.387831],[51.380195,30.491317],[51.631868,31.022564],[52.002781,31.262654],[52.514083,31.492668],[53.921192,32.295288],[55.318192,33.136238],[56.724307,34.117571],[57.352342,34.972378],[57.430442,42.425258],[57.269175,49.457647],[57.076371,50.731905],[56.746993,51.315448],[56.461242,51.757248],[56.048493,52.161128],[55.276043,52.667218],[54.183794,53.046016],[53.072863,53.114688],[51.138123,52.130488],[50.324733,51.221858],[49.707140,50.556424],[49.125639,50.129680],[48.486329,49.890400],[47.695312,49.787358],[46.849826,49.788192],[46.325662,49.939228],[45.371132,50.657250],[44.689302,51.651128],[44.472864,52.148732],[44.373246,53.172213],[44.379173,61.333288],[44.434981,65.884105],[44.560443,67.329748],[46.999743,68.699378],[49.496778,70.053048],[50.458293,70.847008],[50.674338,71.546491],[50.800631,73.260848],[50.867713,82.019358],[50.796789,97.423981],[50.710498,100.571022],[50.575723,101.665708],[50.166259,102.119530],[49.476243,102.389518],[41.348243,102.541838],[33.417093,102.735068],[32.964281,102.843857],[32.515393,102.730068],[26.010960,102.576905],[19.522203,102.663268],[18.631703,104.371578],[17.916563,105.747028],[17.345243,106.920368],[16.741488,107.825218],[15.942943,108.692418],[9.521543,108.798760],[1.851243,108.682418],[1.851202,108.682148]];
